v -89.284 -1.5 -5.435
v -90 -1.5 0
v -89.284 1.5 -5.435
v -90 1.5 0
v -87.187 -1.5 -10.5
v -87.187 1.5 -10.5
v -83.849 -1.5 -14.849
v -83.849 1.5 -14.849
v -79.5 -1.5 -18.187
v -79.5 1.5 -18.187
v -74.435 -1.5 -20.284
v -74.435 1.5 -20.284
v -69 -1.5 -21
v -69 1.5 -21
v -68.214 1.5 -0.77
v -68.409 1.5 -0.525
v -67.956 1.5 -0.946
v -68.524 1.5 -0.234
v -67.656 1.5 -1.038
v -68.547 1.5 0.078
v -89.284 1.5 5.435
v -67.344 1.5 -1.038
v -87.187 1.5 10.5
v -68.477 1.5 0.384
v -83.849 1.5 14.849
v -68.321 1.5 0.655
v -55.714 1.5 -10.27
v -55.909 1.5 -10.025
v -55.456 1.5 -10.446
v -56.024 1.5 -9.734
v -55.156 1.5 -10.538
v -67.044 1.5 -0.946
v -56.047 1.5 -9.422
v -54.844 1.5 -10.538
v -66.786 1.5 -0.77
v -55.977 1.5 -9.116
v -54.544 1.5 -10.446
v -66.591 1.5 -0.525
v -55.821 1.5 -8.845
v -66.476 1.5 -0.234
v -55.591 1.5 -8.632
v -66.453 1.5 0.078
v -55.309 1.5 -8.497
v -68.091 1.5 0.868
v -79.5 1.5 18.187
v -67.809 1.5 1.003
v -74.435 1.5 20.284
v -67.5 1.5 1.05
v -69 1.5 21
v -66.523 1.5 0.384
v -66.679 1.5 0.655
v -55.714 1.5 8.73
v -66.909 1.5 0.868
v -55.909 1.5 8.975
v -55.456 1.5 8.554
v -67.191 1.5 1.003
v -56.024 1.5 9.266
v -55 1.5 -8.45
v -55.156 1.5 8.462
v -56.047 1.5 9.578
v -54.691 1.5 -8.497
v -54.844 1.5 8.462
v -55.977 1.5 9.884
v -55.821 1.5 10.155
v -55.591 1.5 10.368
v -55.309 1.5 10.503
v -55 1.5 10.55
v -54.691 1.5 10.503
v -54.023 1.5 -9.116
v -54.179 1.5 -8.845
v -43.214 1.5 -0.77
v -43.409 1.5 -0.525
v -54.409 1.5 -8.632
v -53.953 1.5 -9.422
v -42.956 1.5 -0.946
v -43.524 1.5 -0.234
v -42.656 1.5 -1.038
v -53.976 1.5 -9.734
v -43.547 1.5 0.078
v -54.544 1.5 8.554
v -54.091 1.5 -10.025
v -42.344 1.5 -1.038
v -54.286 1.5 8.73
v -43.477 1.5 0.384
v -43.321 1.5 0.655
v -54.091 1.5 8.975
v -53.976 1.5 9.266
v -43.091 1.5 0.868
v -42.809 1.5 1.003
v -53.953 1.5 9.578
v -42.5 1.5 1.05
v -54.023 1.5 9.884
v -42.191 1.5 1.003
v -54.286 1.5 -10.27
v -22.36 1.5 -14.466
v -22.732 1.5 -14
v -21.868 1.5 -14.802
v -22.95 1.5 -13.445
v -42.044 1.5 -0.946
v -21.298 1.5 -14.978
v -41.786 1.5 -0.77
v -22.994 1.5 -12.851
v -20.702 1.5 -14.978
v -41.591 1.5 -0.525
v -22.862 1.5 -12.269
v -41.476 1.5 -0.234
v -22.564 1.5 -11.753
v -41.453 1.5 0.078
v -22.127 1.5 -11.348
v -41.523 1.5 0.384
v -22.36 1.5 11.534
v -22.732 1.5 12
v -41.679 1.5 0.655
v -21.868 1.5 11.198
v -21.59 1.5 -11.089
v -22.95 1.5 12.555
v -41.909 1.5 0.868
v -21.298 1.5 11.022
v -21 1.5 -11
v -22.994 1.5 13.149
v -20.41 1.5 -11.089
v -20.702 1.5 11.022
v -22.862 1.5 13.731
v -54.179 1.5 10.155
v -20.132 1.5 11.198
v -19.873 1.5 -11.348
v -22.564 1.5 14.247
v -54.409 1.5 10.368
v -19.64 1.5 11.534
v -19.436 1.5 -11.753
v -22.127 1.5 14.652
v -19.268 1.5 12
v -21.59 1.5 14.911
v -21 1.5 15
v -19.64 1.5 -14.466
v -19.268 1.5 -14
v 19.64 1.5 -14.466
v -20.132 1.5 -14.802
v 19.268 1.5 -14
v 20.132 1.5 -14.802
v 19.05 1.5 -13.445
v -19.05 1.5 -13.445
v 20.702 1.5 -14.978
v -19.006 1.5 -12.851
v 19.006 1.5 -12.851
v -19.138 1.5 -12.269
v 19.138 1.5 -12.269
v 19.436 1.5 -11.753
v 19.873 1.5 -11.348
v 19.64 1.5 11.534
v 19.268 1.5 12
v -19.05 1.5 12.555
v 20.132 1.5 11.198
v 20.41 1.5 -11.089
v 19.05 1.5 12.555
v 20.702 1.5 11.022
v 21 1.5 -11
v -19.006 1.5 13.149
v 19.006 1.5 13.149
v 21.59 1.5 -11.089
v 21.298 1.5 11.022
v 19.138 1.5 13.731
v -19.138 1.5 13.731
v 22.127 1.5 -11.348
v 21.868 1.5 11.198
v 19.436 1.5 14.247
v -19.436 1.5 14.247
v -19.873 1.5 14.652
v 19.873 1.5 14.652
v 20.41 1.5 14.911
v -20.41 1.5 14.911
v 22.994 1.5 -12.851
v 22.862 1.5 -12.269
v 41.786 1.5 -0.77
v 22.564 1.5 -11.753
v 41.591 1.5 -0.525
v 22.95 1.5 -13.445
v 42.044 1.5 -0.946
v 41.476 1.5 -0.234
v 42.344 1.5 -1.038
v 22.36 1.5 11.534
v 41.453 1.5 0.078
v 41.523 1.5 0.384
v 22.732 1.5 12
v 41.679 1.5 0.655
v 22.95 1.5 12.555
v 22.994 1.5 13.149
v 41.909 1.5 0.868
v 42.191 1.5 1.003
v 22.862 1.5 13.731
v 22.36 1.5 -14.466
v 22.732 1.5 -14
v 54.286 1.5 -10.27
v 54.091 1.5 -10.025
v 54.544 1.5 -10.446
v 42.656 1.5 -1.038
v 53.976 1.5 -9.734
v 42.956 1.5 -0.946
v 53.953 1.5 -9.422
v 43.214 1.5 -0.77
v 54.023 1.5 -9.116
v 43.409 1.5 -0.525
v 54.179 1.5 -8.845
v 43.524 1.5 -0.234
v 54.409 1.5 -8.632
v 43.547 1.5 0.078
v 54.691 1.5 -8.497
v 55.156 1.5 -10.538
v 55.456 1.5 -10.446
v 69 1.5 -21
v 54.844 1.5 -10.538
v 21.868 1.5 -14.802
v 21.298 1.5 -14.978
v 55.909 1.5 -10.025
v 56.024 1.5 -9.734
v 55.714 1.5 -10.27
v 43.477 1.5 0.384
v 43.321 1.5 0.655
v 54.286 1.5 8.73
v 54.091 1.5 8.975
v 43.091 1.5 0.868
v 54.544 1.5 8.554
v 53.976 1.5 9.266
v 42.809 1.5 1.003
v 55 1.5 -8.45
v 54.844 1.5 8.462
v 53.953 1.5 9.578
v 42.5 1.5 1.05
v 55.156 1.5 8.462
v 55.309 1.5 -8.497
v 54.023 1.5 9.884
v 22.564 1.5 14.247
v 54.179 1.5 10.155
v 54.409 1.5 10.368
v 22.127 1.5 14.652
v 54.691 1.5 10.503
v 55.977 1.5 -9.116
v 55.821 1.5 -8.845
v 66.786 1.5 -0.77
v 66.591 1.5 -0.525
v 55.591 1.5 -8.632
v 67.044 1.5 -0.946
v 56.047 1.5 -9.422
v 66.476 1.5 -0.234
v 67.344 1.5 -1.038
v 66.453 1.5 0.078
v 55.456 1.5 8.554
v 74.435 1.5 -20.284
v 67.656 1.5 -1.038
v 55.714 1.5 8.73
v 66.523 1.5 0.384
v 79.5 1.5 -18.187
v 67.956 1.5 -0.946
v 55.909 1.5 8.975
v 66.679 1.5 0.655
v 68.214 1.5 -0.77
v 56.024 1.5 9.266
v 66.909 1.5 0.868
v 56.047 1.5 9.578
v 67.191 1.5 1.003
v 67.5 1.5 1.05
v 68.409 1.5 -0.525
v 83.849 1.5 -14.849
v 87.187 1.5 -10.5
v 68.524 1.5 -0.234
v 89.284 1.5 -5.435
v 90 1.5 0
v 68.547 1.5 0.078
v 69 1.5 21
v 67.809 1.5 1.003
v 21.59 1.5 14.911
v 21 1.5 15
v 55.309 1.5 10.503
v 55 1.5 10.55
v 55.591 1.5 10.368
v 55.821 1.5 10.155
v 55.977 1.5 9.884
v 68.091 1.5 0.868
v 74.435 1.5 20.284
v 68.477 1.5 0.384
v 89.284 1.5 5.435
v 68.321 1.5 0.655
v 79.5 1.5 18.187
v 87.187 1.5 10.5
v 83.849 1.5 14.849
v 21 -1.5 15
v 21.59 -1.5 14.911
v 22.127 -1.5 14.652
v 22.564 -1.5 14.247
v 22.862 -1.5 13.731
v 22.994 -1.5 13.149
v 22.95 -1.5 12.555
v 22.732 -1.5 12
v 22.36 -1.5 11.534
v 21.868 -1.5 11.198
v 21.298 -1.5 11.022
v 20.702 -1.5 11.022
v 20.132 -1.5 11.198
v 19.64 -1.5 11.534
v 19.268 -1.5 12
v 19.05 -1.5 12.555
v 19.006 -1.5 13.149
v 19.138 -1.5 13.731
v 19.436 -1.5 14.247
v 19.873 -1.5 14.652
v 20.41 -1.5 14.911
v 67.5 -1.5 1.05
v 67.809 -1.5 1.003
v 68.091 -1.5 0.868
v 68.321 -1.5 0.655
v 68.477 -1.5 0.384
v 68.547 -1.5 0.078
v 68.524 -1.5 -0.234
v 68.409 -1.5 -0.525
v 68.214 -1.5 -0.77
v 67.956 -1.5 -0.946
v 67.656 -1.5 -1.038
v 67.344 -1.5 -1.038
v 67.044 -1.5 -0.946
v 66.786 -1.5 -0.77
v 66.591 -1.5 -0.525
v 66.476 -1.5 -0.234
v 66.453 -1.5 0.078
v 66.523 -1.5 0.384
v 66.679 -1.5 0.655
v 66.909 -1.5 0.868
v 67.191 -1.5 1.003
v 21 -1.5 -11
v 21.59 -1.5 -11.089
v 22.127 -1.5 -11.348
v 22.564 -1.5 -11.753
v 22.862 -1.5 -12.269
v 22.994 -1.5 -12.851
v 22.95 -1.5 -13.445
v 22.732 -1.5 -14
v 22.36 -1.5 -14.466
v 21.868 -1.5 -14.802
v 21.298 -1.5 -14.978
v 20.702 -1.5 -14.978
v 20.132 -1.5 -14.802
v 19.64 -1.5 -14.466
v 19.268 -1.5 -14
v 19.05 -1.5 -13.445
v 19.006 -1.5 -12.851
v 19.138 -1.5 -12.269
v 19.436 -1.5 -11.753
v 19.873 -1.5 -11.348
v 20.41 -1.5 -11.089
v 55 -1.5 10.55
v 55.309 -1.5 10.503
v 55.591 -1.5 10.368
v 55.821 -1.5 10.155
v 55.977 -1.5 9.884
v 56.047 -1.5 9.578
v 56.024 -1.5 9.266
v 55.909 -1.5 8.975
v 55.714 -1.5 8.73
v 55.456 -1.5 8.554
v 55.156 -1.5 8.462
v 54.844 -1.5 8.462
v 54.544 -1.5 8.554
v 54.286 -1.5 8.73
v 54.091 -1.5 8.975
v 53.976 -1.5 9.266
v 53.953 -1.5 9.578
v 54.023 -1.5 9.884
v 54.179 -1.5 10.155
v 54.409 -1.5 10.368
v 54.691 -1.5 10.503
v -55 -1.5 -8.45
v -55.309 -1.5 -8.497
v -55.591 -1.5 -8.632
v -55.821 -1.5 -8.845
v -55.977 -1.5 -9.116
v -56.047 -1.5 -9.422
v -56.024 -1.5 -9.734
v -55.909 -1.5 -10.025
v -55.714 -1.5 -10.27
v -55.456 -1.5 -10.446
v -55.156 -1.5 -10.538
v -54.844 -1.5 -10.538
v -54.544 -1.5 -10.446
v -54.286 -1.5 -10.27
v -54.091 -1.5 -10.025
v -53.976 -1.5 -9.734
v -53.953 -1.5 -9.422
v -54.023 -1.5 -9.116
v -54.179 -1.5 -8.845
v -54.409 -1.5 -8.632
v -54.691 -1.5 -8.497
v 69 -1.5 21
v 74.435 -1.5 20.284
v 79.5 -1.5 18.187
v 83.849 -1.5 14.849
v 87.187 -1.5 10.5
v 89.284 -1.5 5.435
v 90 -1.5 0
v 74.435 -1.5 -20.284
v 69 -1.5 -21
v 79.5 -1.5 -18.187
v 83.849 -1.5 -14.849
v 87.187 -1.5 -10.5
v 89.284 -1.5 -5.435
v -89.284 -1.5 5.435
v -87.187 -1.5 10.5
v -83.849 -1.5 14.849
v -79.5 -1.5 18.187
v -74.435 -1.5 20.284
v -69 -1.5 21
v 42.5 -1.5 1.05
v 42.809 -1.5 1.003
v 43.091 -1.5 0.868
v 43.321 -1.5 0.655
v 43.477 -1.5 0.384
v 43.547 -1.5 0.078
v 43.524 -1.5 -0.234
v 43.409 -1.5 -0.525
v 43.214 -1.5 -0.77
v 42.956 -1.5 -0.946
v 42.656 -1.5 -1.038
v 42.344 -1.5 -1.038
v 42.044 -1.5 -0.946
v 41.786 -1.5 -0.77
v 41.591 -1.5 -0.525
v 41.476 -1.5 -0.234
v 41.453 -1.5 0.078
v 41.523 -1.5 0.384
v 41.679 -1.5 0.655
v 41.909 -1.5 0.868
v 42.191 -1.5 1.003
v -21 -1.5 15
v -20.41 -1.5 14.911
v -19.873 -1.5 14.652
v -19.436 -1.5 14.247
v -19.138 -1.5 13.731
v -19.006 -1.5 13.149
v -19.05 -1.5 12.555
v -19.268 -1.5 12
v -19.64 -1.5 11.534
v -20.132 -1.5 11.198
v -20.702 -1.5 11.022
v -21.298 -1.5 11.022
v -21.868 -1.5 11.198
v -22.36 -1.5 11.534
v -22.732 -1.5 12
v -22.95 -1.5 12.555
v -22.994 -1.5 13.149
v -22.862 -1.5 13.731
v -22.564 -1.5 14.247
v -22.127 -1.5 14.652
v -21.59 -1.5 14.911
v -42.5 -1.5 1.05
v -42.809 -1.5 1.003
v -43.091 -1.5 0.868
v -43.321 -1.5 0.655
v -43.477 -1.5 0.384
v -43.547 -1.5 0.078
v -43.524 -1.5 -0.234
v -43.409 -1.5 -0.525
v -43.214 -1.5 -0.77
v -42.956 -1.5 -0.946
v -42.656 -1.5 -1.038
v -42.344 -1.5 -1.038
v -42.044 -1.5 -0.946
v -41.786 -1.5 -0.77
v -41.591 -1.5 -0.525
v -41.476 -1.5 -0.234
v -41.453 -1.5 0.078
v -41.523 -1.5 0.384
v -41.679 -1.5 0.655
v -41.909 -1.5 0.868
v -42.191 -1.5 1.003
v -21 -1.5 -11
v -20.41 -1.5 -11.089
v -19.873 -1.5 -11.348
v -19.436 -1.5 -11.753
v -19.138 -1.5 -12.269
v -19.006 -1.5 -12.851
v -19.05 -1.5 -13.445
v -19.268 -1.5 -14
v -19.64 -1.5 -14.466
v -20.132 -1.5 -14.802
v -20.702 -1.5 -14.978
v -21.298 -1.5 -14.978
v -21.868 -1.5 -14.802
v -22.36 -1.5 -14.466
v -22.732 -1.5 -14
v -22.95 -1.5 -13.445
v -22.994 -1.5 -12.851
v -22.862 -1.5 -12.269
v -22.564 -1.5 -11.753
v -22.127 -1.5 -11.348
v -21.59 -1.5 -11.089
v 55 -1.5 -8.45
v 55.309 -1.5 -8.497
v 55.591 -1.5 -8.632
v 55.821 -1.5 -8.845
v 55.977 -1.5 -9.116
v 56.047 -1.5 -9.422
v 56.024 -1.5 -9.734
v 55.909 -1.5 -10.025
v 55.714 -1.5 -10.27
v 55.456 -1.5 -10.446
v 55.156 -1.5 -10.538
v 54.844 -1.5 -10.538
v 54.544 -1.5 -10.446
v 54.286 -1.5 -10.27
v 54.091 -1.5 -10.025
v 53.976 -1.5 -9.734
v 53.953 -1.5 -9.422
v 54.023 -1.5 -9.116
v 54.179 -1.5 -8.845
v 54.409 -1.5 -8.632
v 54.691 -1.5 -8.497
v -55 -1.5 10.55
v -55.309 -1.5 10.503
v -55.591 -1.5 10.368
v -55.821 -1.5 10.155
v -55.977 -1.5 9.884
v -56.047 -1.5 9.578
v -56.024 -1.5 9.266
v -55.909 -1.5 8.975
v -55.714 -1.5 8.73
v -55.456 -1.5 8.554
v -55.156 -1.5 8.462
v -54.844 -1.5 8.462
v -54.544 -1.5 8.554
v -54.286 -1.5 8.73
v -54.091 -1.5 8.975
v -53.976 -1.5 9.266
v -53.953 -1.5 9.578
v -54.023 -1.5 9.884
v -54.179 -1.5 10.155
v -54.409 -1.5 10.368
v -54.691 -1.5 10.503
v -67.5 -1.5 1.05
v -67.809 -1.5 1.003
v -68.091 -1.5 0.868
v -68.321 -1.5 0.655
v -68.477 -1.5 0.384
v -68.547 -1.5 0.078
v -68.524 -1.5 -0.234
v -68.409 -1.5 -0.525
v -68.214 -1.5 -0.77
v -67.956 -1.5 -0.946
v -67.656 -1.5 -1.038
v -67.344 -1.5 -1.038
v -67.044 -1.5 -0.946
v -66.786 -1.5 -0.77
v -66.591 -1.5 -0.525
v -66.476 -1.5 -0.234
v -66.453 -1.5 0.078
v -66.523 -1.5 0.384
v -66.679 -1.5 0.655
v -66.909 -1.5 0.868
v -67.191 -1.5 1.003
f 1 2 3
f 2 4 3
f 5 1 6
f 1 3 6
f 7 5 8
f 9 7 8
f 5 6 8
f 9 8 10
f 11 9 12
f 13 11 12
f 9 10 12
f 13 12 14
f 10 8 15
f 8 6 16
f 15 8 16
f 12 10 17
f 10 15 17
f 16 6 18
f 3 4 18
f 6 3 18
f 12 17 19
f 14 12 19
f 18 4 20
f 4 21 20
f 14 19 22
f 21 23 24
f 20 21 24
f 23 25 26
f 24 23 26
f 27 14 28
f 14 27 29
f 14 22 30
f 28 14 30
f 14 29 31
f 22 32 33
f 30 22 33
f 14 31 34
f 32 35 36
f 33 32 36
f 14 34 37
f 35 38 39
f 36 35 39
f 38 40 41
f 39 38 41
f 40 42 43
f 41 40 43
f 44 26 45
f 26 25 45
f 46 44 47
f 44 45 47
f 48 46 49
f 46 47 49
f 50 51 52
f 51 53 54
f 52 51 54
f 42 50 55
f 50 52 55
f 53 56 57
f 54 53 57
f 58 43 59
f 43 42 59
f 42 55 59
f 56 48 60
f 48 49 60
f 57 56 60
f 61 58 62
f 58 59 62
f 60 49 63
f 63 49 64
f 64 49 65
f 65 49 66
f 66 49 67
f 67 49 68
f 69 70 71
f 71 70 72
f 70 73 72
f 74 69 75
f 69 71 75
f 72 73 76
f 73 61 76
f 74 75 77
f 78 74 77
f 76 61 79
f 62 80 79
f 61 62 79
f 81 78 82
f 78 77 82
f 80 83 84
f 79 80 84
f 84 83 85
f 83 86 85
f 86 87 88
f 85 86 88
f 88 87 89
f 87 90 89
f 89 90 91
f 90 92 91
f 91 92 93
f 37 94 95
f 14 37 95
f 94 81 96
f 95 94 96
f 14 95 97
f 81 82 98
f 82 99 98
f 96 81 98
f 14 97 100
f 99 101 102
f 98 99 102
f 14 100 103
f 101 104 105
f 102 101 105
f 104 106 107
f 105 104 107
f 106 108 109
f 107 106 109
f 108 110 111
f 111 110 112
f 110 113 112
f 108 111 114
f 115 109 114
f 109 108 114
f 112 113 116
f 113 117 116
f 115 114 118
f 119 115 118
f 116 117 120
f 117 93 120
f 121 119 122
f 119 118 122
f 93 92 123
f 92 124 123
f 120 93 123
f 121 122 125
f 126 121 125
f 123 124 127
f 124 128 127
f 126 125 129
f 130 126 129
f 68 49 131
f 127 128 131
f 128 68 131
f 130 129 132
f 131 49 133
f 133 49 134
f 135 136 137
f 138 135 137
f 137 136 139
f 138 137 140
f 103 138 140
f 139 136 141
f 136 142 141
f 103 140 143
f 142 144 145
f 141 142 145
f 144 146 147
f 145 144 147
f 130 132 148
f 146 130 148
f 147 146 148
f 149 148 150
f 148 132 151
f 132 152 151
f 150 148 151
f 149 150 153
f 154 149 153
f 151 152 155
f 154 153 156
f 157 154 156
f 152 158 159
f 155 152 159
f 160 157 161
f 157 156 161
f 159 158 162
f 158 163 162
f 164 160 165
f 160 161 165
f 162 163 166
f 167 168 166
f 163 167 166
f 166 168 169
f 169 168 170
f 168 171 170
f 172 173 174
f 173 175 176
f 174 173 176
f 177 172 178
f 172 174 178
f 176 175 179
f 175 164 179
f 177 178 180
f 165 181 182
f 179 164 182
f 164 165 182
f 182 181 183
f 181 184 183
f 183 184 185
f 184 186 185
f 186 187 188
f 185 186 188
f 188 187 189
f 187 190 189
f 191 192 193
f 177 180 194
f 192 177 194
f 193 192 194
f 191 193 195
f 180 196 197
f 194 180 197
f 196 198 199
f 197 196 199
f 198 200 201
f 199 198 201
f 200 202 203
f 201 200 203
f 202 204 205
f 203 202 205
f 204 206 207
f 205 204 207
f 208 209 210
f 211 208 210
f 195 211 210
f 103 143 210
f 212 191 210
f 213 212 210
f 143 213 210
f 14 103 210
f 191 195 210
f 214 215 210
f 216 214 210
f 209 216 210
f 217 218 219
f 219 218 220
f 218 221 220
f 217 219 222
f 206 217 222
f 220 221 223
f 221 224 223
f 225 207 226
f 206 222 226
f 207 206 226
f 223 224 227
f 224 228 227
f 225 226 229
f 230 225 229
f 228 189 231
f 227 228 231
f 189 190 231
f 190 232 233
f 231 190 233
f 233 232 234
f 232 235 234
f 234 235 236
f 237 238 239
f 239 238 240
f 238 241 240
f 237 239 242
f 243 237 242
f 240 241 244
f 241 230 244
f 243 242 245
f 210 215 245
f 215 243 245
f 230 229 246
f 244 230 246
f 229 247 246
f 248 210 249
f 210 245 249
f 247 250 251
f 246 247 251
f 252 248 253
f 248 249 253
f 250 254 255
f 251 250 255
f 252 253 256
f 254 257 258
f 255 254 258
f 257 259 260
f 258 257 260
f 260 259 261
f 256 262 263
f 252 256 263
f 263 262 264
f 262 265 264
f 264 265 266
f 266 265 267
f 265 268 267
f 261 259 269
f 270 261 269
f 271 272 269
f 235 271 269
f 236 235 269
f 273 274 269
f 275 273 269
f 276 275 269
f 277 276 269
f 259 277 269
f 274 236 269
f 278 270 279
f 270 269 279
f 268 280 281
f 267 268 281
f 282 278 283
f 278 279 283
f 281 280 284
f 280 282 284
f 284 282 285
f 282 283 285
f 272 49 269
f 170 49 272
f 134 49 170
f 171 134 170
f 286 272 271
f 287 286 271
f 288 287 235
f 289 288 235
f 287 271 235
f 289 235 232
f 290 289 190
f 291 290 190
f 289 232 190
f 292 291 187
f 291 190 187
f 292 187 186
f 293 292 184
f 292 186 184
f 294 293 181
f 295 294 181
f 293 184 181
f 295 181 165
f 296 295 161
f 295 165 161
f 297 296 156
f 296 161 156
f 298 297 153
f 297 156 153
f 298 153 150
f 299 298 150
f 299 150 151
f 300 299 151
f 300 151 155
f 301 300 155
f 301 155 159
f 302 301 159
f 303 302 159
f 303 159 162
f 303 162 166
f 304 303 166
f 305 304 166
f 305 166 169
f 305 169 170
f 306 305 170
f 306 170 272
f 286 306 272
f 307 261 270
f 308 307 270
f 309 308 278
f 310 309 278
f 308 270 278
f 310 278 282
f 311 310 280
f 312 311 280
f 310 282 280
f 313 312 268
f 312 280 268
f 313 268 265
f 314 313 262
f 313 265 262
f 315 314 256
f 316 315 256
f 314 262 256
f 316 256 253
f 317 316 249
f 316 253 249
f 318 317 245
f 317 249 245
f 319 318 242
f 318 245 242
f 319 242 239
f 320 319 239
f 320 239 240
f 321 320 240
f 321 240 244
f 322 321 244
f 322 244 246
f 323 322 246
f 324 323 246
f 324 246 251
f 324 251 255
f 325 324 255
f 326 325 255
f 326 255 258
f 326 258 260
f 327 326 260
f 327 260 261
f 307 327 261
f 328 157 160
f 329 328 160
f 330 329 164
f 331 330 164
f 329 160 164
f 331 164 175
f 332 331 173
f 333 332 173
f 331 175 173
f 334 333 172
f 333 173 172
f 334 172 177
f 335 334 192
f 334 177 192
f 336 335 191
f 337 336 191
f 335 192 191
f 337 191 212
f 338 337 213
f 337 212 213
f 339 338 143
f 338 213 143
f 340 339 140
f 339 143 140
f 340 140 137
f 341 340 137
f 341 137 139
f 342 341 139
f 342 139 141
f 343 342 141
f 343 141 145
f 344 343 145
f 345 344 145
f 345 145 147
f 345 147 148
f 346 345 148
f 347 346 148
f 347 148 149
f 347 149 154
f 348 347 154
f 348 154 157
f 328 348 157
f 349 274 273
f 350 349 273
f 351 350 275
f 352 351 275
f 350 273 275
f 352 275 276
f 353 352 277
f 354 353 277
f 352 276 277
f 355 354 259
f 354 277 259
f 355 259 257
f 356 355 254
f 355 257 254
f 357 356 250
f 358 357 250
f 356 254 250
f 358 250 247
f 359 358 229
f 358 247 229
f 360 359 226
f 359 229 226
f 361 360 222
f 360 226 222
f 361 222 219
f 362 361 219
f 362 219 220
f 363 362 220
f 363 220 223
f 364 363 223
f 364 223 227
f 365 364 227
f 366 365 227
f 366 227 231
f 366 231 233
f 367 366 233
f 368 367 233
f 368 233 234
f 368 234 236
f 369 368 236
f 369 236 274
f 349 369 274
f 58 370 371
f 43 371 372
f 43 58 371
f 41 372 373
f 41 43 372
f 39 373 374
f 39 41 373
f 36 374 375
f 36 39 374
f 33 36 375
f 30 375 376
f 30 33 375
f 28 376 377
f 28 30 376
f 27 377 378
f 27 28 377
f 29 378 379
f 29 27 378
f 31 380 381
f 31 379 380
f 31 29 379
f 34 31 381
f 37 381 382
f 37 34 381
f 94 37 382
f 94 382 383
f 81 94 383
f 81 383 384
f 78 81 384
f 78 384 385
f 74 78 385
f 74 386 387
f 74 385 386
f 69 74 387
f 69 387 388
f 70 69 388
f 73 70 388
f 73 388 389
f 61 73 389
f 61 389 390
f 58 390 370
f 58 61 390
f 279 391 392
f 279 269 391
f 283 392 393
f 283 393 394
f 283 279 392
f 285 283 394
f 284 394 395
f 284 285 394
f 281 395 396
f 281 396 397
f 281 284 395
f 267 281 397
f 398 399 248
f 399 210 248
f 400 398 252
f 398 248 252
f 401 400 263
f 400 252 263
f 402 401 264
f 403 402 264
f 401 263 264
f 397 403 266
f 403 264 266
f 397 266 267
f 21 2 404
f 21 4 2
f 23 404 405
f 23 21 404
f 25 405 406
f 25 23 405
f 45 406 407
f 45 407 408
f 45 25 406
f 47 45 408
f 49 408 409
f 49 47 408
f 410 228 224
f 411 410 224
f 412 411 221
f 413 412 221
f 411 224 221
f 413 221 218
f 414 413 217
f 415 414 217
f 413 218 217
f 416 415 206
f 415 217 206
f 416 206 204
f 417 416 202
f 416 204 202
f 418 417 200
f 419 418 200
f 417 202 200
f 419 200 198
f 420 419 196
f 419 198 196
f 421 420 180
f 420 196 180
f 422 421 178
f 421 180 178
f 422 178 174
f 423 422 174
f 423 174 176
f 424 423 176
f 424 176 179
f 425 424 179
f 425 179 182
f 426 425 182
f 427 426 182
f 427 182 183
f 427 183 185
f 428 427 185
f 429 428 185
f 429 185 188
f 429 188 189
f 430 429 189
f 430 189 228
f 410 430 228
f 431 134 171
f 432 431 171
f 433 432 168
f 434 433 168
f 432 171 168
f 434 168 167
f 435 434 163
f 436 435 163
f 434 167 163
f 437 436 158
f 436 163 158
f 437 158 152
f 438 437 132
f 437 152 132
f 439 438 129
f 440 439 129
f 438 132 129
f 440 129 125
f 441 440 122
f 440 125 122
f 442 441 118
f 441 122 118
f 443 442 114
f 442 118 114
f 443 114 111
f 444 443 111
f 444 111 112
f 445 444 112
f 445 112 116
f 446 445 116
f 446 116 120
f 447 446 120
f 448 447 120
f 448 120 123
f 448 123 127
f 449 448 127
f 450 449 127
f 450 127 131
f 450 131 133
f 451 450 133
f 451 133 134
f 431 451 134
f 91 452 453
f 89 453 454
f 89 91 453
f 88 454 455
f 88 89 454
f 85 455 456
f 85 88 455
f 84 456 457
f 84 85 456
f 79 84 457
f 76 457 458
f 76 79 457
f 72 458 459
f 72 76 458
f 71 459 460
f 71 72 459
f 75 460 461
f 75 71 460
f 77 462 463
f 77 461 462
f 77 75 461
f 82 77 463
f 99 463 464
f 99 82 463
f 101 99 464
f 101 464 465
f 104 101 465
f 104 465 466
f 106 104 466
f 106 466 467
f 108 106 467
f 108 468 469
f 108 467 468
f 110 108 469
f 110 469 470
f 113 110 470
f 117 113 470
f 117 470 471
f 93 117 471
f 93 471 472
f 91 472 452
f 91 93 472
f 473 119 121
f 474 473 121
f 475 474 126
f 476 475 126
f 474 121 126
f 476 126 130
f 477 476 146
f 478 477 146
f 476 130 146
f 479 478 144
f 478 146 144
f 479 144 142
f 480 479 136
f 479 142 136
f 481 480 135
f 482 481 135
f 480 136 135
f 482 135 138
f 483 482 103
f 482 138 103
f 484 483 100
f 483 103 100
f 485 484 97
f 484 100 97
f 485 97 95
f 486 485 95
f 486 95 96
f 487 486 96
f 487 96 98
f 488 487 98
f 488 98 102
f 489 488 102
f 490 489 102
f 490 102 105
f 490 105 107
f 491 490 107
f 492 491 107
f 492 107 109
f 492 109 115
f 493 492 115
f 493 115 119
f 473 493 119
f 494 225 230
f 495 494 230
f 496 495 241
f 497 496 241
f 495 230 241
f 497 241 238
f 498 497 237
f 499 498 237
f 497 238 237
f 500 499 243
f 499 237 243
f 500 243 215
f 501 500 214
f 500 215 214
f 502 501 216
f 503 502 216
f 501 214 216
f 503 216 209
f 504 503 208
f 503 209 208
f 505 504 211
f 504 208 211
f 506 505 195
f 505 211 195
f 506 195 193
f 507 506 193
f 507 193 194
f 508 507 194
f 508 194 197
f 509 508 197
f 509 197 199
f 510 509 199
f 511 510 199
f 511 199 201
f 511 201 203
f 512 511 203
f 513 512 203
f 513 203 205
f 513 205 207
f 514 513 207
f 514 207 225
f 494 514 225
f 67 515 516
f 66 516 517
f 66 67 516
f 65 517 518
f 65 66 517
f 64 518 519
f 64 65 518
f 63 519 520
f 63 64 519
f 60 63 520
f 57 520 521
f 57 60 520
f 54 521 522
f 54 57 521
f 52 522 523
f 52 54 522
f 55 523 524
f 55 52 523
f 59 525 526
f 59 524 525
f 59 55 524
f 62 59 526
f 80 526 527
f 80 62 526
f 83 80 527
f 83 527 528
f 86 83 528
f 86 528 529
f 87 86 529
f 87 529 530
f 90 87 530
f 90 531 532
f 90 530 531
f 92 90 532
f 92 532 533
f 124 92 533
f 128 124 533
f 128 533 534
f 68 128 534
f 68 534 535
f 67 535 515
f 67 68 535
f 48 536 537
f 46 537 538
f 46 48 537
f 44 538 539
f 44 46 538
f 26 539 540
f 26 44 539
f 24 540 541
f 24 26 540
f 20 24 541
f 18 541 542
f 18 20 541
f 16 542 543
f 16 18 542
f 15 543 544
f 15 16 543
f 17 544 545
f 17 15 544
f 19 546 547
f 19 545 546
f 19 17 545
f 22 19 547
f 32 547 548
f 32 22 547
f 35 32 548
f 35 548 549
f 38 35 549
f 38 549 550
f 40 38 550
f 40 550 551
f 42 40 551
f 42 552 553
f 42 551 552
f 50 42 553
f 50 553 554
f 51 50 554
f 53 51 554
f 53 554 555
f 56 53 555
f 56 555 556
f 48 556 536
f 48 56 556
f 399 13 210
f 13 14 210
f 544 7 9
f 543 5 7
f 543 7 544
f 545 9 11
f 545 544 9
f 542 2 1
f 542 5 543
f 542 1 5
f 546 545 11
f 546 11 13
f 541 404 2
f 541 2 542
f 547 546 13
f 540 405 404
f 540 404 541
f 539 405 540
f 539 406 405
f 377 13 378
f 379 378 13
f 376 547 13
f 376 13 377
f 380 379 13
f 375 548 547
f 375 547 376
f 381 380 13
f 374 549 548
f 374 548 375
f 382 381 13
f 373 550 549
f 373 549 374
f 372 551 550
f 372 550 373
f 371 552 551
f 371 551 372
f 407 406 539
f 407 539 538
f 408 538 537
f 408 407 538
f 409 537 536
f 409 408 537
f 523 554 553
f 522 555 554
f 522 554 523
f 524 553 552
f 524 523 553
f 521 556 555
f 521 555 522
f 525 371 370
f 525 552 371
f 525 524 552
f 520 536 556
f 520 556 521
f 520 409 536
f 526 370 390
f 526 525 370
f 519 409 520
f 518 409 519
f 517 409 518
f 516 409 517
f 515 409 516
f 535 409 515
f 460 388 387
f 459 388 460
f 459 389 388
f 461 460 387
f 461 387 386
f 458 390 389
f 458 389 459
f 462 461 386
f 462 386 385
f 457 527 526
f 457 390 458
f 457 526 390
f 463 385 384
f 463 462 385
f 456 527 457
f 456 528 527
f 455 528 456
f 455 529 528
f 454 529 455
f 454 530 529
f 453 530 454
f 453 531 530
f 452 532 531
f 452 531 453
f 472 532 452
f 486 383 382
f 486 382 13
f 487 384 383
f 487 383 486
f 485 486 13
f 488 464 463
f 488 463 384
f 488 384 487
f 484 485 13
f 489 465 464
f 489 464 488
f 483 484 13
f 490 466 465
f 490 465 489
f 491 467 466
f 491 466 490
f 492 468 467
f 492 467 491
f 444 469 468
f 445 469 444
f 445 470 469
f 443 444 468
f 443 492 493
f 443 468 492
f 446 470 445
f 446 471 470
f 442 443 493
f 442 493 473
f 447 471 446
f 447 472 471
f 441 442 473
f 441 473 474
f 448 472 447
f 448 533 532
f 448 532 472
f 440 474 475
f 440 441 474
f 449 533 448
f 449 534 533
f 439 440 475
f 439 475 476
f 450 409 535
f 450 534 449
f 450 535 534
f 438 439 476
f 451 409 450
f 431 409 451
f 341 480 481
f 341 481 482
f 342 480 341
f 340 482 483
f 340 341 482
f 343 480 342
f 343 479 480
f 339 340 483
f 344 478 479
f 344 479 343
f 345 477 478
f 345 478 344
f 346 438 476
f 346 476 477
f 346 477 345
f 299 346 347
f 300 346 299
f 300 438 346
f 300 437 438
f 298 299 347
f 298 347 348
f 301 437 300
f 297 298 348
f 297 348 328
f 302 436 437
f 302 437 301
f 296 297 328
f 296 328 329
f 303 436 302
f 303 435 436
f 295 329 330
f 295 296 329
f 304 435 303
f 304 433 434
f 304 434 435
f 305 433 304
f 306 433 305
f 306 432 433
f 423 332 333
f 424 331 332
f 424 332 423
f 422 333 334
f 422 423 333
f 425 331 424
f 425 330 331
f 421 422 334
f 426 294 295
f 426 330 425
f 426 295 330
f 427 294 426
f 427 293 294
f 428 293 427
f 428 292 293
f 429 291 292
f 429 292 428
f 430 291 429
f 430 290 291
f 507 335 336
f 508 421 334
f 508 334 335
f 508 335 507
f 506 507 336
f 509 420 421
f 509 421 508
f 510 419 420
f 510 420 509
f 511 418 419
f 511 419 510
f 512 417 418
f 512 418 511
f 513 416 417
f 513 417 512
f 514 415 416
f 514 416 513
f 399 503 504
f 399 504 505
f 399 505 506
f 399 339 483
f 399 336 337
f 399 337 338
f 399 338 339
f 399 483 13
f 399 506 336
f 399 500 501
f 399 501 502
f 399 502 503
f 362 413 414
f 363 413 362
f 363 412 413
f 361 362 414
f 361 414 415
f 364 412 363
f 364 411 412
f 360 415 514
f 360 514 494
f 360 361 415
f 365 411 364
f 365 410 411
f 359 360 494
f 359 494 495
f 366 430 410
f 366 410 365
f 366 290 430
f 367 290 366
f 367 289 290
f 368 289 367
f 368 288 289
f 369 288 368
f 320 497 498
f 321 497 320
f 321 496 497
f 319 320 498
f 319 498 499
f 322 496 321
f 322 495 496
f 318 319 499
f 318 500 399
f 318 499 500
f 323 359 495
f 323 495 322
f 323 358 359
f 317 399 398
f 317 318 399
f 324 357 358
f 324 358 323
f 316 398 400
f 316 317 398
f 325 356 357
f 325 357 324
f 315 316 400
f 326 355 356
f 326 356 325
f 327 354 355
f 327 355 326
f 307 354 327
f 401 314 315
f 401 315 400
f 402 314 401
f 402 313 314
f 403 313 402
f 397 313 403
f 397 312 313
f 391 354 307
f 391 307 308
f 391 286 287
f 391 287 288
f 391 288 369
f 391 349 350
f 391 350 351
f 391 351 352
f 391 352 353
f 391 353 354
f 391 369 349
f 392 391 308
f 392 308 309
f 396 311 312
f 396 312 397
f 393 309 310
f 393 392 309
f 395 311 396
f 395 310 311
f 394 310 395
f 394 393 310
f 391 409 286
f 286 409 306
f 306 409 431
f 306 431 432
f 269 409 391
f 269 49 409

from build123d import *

# Parameters (mm, degrees)
SKETCH_1_W          = 180
SKETCH_1_H          = 3
EXTRUDE_1_DEPTH     = 21
SKETCH_2_R          = 2
CUT_EXTRUDE_1_DEPTH = 93.466210045
SKETCH_3_R          = 1.05
CUT_EXTRUDE_2_DEPTH = 93.466210045
FILLET_1_R          = 21


with BuildPart() as part:
    # 草图1 → 凸台-拉伸1 (new, symmetric)
    with BuildSketch(Plane.XY):
        Rectangle(SKETCH_1_W, SKETCH_1_H)
    extrude(amount=EXTRUDE_1_DEPTH, both=True)

    # 草图2 → 切除-拉伸1 (cut, through all)
    with BuildSketch(Plane(origin=(0, 1.5, 0), x_dir=(1, 0, 0), z_dir=(0, 1, 0))):
        with Locations(Location((-21, 13, 0), (0, 0, 270))):
            Circle(SKETCH_2_R)
        with Locations(Location((21, 13, 0), (0, 0, 270))):
            Circle(SKETCH_2_R)
        with Locations(Location((21, -13, 0), (0, 0, 270))):
            Circle(SKETCH_2_R)
        with Locations(Location((-21, -13, 0), (0, 0, 270))):
            Circle(SKETCH_2_R)
    extrude(amount=-CUT_EXTRUDE_1_DEPTH, mode=Mode.SUBTRACT)

    # 草图3 → 切除-拉伸2 (cut, through all)
    with BuildSketch(Plane(origin=(0, 1.5, 0), x_dir=(1, 0, 0), z_dir=(0, 1, 0))):
        with Locations(Location((55, 9.5, 0), (0, 0, 270))):
            Circle(SKETCH_3_R)
        with Locations(Location((55, -9.5, 0), (0, 0, 270))):
            Circle(SKETCH_3_R)
        with Locations(Location((42.5, 0, 0), (0, 0, 270))):
            Circle(SKETCH_3_R)
        with Locations(Location((67.5, 0, 0), (0, 0, 270))):
            Circle(SKETCH_3_R)
    cut_extrude_2 = extrude(amount=-CUT_EXTRUDE_2_DEPTH, mode=Mode.SUBTRACT)

    # 镜向1: 切除-拉伸2 across plane
    add(cut_extrude_2.mirror(Plane(origin=(0, 0, 0), x_dir=(0, 0, 1), z_dir=(1, 0, 0))), mode=Mode.SUBTRACT)

    # 圆角1
    fillet_1_edges = [part.edges().sort_by_distance(p)[0] for p in [
        (90, 0, 21),
        (-90, 0, 21),
        (-90, 0, -21),
        (90, 0, -21),
    ]]
    fillet(fillet_1_edges, radius=FILLET_1_R - 0.0001)  # a hair under: the kernel refuses the full size


solid = part.part
